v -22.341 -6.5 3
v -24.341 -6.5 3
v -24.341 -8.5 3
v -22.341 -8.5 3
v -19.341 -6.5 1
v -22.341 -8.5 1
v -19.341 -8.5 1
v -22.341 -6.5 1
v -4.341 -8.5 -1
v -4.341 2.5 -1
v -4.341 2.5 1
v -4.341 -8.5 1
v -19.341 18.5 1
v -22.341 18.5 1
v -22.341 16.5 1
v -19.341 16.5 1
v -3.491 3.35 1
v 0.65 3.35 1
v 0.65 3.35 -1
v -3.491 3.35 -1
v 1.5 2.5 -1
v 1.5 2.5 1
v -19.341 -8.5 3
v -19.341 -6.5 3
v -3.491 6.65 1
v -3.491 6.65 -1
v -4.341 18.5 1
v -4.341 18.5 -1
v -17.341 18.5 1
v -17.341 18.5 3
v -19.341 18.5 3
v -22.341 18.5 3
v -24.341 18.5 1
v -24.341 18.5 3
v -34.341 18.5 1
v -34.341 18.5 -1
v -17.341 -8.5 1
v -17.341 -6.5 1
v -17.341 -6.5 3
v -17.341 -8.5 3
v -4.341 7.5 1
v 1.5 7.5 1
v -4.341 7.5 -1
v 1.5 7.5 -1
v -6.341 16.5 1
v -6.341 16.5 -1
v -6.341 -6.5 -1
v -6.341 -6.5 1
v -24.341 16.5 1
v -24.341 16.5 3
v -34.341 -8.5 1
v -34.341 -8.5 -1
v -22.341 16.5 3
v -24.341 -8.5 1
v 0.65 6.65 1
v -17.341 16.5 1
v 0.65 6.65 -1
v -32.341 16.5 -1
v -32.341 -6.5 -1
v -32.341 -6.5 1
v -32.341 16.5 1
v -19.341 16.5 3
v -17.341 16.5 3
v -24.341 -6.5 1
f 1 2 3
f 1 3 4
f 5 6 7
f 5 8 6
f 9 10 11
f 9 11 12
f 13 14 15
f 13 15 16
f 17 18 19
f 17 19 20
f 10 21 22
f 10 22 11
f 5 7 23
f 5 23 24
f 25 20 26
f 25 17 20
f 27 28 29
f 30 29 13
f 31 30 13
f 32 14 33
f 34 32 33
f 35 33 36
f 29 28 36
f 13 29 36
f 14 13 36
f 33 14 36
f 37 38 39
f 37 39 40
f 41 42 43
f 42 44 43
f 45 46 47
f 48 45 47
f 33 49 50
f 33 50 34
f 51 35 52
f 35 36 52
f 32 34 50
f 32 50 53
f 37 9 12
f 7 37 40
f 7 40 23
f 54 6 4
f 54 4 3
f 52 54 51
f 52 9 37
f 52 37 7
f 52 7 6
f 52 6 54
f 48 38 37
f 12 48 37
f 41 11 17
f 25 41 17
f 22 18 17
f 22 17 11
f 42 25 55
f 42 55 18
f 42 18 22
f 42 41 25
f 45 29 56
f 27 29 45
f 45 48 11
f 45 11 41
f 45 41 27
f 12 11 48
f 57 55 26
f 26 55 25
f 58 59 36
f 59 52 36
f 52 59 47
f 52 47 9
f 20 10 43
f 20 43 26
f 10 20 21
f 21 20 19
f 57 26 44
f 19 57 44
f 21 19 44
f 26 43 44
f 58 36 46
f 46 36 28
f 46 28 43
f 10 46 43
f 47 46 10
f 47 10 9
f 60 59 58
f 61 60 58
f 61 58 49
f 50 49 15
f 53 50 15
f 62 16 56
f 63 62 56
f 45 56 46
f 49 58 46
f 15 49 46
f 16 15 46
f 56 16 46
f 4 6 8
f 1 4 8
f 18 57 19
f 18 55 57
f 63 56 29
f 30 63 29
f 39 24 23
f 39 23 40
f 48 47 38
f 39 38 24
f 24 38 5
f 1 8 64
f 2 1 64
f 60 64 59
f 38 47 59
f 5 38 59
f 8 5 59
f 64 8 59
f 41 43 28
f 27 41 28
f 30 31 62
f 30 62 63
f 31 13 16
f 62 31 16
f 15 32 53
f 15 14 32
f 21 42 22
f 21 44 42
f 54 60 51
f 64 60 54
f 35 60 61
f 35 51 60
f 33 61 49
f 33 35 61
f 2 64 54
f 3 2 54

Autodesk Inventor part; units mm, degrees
ref_plane "YZ Plane" through (0, 0, 0) normal (1, 0, 0) x (0, 1, 0)
ref_plane "XZ Plane" through (0, 0, 0) normal (0, 1, 0) x (-1, 0, 0)
ref_plane "XY Plane" through (0, 0, 0) normal (0, 0, 1) x (1, 0, 0)
ref_plane "Work Plane1" through (0, -1.5, -1) normal (0, 0, 1) x (1, 0, 0)
sketch "Sketch1" plane through (0, -1.5, -1) normal (0, 0, 1) x (1, 0, 0)
  line L0 (-2.8412, 5.5) -> (-2.8412, 7.5) projected
  line L1 (-2.8412, 5.5) -> (-2.8412, 7.5) projected
  line L2 (-2.8412, 5.5) -> (-2.8412, 7.5) projected
  line L3 (-2.8412, 7.5) -> (0, 7.5) projected
  line L4 (-2.8412, 5.5) -> (0, 5.5)
  line L5 (0, 5.5) -> (0, 7.5)
  line L6 (0, 7.5) -> (-2.8412, 7.5)
  line L7 (-2.8412, 7.5) -> (-2.8412, 5.5)
  line L8 (-2.8412, 7.5) -> (-2.8412, 9)
  line L9 (-2.8412, 9) -> (-4.3412, 9)
  line L10 (0, 5.5) -> (0, 4)
  line L11 (0, 4) -> (1.5, 4)
  line L12 (1.5, 4) -> (-4.3412, 4)
  line L13 (-4.3412, 4) -> (-4.3412, 9)
  line L14 (-4.3412, 9) -> (1.5, 9)
  line L15 (1.5, 9) -> (1.5, 4)
  line L16 (-4.3412, 4) -> (-4.3412, -7)
  line L17 (-4.3412, -7) -> (-34.3412, -7)
  line L18 (-4.3412, 9) -> (-4.3412, 20)
  line L19 (-4.3412, 20) -> (-34.3412, 20)
  line L20 (-34.3412, 20) -> (-34.3412, -7)
  line L21 (-4.3412, -7) -> (-4.3412, -5)
  line L22 (-4.3412, -5) -> (-6.3412, -5)
  line L23 (-34.3412, 20) -> (-34.3412, 18)
  line L24 (-34.3412, 18) -> (-32.3412, 18)
  line L25 (-6.3412, -5) -> (-32.3412, -5)
  line L26 (-32.3412, -5) -> (-32.3412, 18)
  line L27 (-32.3412, 18) -> (-6.3412, 18)
  line L28 (-6.3412, 18) -> (-6.3412, -5)
  point P0 (0, 1.5)
  point P1 (-0.8412, 6.5)
  dimension "d0" = 1.5
  dimension "d1" = 1.5
  dimension "d2" = 1.5
  dimension "d3" = 1.5
  dimension "d4" = 11
  dimension "d5" = 30
  dimension "d6" = 11
  dimension "d7" = 2
  dimension "d8" = 2
  dimension "d9" = 2
  dimension "d10" = 2
extrude "Extrusion1" add sketch "Sketch1" along normal blind 2 contours L4 L10 L12 L13 L9 L8 L0 | L8 L14 L15 L11 L10 L5 L3 | L13 L16 L22 L28 L27 L24 L20 L19 L18 | L16 L17 L20 L24 L26 L25 L22
sketch "Sketch2" plane through (0, -1.5, 1) normal (0, 0, 1) x (1, 0, 0)
  line L0 (-34.3412, -7) -> (-4.3412, -7) projected
  line L1 (-4.3412, 20) -> (-34.3412, 20) projected
  line L2 (-6.3412, -5) -> (-19.3412, -5)
  line L3 (-6.3412, -5) -> (-32.3412, -5) projected
  line L4 (-19.3412, -5) -> (-22.3412, -5)
  line L5 (-6.3412, 18) -> (-19.3412, 18)
  line L6 (-32.3412, 18) -> (-6.3412, 18) projected
  line L7 (-19.3412, 18) -> (-22.3412, 18)
  line L8 (-22.3412, -5) -> (-24.3412, -5)
  line L9 (-24.3412, -5) -> (-24.3412, -7)
  line L10 (-24.3412, -7) -> (-22.3412, -7)
  line L11 (-22.3412, -7) -> (-22.3412, -5)
  line L12 (-22.3412, 18) -> (-24.3412, 18)
  line L13 (-24.3412, 18) -> (-24.3412, 20)
  line L14 (-24.3412, 20) -> (-22.3412, 20)
  line L15 (-22.3412, 20) -> (-22.3412, 18)
  line L16 (-19.3412, 18) -> (-17.3412, 18)
  line L17 (-17.3412, 18) -> (-17.3412, 20)
  line L18 (-17.3412, 20) -> (-19.3412, 20)
  line L19 (-19.3412, 20) -> (-19.3412, 18)
  line L20 (-19.3412, -5) -> (-17.3412, -5)
  line L21 (-17.3412, -5) -> (-17.3412, -7)
  line L22 (-17.3412, -7) -> (-19.3412, -7)
  line L23 (-19.3412, -7) -> (-19.3412, -5)
  point P0 (0, 1.5)
  dimension "d13" = 13
  dimension "d14" = 3
  dimension "d15" = 2
  dimension "d16" = 2
  dimension "d17" = 2
  dimension "d18" = 2
extrude "Extrusion2" add sketch "Sketch2" along normal blind 2 contours L9 L3 L11 L0 | L23 L2 L21 L0 | L17 L5 L19 L1 | L15 L6 L13 L1
sketch "Sketch3" plane through (0, -1.5, 1) normal (0, 0, 1) x (1, 0, 0)
  line L0 (-2.8412, 5.5) -> (-2.8412, 7.5) projected
  line L1 (-2.8412, 7.5) -> (0, 7.5) projected
  line L2 (0, 7.5) -> (0, 5.5) projected
  line L3 (0, 5.5) -> (-2.8412, 5.5) projected
  line L4 (-2.8412, 7.5) -> (-2.8412, 8.15)
  line L5 (-2.8412, 8.15) -> (-3.4912, 8.15)
  line L6 (-2.8412, 5.5) -> (0, 5.5) projected
  line L7 (0, 5.5) -> (0, 4.85)
  line L8 (0, 4.85) -> (0.65, 4.85)
  line L9 (0.65, 4.85) -> (-3.4912, 4.85)
  line L10 (-3.4912, 4.85) -> (-3.4912, 8.15)
  line L11 (-3.4912, 8.15) -> (0.65, 8.15)
  line L12 (0.65, 8.15) -> (0.65, 4.85)
  point P0 (0, 1.5)
  dimension "d21" = 0.65
  dimension "d22" = 0.65
  dimension "d23" = 0.65
  dimension "d24" = 0.65
extrude "Extrusion3" cut sketch "Sketch3" against normal up to next contours L3 L7 L9 L10 L5 L4 L0 | L4 L11 L12 L8 L7 L2 L1
equation "\"d6\" = d4"
equation "\"d21\" = d24"
equation "\"d22\" = d24"
equation "\"d23\" = d24"
properties part number "back_pack_side_3"
